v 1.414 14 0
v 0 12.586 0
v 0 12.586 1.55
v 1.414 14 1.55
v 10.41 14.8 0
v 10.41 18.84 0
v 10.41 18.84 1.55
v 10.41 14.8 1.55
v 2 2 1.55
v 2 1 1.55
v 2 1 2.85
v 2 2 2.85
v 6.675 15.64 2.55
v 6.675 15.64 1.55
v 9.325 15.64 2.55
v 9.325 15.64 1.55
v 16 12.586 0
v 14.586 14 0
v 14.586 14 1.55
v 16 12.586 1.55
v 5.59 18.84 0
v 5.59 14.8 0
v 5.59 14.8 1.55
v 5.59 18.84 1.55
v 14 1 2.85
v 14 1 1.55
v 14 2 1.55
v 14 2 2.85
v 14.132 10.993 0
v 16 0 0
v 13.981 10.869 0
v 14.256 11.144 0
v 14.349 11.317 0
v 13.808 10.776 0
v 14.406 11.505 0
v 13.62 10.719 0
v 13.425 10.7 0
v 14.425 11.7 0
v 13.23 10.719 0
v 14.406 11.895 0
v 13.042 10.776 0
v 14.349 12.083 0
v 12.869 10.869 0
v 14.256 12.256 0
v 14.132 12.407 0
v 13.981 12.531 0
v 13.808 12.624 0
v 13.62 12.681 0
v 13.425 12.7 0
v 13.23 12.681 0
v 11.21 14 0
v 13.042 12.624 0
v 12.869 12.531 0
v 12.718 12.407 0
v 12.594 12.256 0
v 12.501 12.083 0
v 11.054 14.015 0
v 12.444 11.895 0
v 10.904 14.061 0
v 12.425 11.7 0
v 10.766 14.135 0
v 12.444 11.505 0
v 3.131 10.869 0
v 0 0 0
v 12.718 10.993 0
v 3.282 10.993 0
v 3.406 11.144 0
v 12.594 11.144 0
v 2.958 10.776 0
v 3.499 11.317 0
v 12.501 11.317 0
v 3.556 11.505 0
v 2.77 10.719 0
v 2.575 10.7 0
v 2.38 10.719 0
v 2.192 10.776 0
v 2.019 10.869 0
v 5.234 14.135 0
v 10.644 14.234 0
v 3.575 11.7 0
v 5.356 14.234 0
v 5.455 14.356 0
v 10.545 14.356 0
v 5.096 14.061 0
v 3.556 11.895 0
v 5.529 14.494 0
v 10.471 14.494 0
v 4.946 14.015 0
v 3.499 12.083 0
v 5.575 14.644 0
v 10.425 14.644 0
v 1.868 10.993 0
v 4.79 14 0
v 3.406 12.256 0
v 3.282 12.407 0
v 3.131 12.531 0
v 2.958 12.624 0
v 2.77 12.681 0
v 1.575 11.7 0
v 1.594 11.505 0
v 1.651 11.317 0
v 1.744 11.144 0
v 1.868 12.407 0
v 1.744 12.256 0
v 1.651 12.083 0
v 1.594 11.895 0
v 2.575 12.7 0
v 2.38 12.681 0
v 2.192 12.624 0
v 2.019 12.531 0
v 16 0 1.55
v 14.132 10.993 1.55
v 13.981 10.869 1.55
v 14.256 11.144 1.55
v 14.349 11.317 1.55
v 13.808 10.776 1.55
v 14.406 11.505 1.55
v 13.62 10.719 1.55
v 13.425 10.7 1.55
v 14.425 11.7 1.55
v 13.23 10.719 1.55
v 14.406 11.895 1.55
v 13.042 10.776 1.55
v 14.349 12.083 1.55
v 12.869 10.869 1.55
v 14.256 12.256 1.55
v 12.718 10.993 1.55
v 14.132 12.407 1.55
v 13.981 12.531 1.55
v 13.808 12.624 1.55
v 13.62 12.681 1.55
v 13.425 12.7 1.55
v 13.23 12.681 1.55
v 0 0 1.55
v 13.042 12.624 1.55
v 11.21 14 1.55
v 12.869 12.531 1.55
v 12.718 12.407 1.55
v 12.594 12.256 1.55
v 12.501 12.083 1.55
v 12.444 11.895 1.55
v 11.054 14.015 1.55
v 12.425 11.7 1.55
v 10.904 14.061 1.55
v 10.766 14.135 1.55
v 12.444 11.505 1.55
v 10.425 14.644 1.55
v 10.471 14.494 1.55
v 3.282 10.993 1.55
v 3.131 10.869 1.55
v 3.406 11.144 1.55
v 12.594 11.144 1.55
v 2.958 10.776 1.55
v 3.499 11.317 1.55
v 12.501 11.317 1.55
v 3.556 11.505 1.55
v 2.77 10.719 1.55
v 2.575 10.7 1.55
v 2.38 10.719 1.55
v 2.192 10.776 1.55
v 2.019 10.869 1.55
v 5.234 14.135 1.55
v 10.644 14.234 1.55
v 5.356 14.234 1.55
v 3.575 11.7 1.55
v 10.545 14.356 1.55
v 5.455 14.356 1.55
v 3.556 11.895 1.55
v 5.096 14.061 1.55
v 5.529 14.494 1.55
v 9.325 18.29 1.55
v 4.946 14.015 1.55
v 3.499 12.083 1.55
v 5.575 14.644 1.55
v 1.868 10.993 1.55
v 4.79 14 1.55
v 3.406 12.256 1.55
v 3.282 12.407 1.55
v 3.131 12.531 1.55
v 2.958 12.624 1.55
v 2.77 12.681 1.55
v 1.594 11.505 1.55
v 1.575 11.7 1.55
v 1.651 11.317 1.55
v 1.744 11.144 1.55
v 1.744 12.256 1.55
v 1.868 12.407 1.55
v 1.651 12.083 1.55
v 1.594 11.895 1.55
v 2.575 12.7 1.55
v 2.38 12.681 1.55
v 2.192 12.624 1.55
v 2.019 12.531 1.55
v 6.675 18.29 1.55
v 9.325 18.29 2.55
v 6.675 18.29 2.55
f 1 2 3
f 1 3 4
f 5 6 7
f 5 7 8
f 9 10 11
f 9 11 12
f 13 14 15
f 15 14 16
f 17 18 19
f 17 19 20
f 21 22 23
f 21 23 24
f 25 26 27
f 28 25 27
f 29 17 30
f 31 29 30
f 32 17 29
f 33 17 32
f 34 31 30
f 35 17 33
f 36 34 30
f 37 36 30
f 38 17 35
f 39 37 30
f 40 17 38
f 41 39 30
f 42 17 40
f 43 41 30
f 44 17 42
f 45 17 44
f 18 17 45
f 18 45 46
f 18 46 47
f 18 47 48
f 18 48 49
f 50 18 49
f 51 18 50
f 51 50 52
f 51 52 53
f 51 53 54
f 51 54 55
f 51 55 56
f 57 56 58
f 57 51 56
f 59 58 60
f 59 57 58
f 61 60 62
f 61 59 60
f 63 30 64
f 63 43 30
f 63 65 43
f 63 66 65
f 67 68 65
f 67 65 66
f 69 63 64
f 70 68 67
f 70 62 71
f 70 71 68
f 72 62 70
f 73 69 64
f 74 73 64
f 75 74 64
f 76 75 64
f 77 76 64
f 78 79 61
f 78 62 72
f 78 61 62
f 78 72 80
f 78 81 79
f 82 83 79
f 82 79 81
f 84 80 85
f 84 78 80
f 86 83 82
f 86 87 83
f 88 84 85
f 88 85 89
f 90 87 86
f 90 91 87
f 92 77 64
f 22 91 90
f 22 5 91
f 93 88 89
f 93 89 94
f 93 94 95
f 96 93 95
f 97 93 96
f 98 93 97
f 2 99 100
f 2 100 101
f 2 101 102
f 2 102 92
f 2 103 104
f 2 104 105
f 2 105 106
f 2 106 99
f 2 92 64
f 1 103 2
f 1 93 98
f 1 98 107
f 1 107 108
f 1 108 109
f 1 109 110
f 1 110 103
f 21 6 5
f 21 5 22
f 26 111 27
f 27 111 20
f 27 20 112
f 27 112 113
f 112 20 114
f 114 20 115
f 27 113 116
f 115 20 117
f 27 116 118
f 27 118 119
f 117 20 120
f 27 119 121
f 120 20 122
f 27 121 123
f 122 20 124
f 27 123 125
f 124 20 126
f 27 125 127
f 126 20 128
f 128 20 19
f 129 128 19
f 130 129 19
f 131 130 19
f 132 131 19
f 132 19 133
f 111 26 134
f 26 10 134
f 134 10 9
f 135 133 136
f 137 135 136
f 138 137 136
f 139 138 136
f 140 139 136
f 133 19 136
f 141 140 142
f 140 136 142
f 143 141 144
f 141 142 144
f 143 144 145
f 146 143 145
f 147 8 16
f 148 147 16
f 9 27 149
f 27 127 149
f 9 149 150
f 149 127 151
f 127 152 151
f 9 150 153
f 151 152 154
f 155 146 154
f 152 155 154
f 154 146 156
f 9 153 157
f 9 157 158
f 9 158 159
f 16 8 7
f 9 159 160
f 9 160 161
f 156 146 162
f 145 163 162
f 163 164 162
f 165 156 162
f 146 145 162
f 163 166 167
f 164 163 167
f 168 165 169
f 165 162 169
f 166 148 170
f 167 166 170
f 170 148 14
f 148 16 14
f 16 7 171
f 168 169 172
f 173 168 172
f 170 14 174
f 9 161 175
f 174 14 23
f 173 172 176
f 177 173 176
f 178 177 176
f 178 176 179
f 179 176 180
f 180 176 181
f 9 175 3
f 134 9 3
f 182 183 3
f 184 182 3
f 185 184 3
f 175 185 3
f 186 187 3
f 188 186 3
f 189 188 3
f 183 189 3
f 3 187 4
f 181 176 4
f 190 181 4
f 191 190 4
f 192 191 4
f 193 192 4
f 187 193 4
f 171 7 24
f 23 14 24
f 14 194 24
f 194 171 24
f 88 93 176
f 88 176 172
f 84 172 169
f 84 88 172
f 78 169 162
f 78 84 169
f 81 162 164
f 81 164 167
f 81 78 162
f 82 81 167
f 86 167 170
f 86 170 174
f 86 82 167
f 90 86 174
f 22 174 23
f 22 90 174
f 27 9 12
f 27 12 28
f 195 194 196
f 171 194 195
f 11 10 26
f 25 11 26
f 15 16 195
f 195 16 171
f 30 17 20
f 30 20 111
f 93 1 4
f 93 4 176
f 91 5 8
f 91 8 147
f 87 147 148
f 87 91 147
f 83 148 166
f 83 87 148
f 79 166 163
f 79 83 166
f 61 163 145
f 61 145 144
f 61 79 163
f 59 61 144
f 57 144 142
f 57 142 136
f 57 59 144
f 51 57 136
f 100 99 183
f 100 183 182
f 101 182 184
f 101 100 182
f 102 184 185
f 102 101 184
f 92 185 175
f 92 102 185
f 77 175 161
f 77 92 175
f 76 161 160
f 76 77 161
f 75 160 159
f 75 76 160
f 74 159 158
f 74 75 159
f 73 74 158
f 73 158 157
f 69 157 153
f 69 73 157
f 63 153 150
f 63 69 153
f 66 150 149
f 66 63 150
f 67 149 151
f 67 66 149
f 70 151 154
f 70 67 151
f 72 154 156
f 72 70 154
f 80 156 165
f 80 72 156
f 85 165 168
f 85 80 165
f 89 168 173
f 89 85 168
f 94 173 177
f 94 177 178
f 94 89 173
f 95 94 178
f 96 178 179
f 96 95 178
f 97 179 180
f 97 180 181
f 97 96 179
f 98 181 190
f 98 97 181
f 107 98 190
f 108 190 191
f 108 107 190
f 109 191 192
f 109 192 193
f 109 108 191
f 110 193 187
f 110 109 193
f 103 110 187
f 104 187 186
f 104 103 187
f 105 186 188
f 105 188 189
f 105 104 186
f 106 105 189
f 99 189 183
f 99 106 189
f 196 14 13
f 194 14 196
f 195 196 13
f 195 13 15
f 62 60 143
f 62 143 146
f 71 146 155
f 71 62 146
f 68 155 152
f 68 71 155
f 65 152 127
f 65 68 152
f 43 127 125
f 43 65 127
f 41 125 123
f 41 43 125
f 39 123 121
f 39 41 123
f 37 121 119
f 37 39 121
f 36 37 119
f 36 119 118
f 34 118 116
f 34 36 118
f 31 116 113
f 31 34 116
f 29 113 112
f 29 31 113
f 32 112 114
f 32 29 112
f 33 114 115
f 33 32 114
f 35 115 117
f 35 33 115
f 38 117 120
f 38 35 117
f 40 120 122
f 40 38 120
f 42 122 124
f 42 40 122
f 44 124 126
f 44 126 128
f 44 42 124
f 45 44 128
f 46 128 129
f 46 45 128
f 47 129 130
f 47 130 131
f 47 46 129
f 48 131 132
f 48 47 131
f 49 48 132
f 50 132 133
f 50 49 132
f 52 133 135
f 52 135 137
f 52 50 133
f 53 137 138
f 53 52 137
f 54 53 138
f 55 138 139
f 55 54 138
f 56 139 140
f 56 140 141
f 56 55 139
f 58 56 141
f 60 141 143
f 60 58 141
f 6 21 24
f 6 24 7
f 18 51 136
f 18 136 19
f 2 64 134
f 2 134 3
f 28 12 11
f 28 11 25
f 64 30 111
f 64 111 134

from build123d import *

# Parameters (mm, degrees)
SKETCH1_R           = 1
BOSS_EXTRUDE1_DEPTH = 1.55
SKETCH2_W           = 2.65
SKETCH2_H           = 2.65
BOSS_EXTRUDE2_DEPTH = 1
SKETCH3_W           = 12
SKETCH3_H           = 1
BOSS_EXTRUDE3_DEPTH = 1.3


with BuildPart() as part:
    # Sketch1 → Boss-Extrude1 (new body)
    with BuildSketch(Plane.XY):
        with BuildLine():
            Line((11.21, 14), (14.585786438, 14))
            Line((14.585786438, 14), (16, 12.585786438))
            Line((16, 12.585786438), (16, 0))
            Line((16, 0), (0, 0))
            Line((0, 0), (0, 12.585786438))
            Line((0, 12.585786438), (1.414213562, 14))
            Line((1.414213562, 14), (4.79, 14))
            ThreePointArc((4.79, 14), (5.355685425, 14.234314575), (5.59, 14.8))
            Line((5.59, 14.8), (5.59, 18.84))
            Line((5.59, 18.84), (10.41, 18.84))
            Line((10.41, 18.84), (10.41, 14.8))
            ThreePointArc((10.41, 14.8), (10.644314575, 14.234314575), (11.21, 14))
        make_face()
        with Locations(Location((2.575, 11.7, 0), (0, 0, 180))):
            Circle(SKETCH1_R, mode=Mode.SUBTRACT)
        with Locations(Location((13.425, 11.7, 0), (0, 0, 180))):
            Circle(SKETCH1_R, mode=Mode.SUBTRACT)
    extrude(amount=BOSS_EXTRUDE1_DEPTH)

    # Sketch2 → Boss-Extrude2 (add)
    with BuildSketch(Plane.XY.offset(1.55)):
        with Locations((8, 16.965)):
            Rectangle(SKETCH2_W, SKETCH2_H)
    extrude(amount=BOSS_EXTRUDE2_DEPTH)

    # Sketch3 → Boss-Extrude3 (add)
    with BuildSketch(Plane.XY.offset(1.55)):
        with Locations((8, 1.5)):
            Rectangle(SKETCH3_W, SKETCH3_H)
    extrude(amount=BOSS_EXTRUDE3_DEPTH)


solid = part.part
